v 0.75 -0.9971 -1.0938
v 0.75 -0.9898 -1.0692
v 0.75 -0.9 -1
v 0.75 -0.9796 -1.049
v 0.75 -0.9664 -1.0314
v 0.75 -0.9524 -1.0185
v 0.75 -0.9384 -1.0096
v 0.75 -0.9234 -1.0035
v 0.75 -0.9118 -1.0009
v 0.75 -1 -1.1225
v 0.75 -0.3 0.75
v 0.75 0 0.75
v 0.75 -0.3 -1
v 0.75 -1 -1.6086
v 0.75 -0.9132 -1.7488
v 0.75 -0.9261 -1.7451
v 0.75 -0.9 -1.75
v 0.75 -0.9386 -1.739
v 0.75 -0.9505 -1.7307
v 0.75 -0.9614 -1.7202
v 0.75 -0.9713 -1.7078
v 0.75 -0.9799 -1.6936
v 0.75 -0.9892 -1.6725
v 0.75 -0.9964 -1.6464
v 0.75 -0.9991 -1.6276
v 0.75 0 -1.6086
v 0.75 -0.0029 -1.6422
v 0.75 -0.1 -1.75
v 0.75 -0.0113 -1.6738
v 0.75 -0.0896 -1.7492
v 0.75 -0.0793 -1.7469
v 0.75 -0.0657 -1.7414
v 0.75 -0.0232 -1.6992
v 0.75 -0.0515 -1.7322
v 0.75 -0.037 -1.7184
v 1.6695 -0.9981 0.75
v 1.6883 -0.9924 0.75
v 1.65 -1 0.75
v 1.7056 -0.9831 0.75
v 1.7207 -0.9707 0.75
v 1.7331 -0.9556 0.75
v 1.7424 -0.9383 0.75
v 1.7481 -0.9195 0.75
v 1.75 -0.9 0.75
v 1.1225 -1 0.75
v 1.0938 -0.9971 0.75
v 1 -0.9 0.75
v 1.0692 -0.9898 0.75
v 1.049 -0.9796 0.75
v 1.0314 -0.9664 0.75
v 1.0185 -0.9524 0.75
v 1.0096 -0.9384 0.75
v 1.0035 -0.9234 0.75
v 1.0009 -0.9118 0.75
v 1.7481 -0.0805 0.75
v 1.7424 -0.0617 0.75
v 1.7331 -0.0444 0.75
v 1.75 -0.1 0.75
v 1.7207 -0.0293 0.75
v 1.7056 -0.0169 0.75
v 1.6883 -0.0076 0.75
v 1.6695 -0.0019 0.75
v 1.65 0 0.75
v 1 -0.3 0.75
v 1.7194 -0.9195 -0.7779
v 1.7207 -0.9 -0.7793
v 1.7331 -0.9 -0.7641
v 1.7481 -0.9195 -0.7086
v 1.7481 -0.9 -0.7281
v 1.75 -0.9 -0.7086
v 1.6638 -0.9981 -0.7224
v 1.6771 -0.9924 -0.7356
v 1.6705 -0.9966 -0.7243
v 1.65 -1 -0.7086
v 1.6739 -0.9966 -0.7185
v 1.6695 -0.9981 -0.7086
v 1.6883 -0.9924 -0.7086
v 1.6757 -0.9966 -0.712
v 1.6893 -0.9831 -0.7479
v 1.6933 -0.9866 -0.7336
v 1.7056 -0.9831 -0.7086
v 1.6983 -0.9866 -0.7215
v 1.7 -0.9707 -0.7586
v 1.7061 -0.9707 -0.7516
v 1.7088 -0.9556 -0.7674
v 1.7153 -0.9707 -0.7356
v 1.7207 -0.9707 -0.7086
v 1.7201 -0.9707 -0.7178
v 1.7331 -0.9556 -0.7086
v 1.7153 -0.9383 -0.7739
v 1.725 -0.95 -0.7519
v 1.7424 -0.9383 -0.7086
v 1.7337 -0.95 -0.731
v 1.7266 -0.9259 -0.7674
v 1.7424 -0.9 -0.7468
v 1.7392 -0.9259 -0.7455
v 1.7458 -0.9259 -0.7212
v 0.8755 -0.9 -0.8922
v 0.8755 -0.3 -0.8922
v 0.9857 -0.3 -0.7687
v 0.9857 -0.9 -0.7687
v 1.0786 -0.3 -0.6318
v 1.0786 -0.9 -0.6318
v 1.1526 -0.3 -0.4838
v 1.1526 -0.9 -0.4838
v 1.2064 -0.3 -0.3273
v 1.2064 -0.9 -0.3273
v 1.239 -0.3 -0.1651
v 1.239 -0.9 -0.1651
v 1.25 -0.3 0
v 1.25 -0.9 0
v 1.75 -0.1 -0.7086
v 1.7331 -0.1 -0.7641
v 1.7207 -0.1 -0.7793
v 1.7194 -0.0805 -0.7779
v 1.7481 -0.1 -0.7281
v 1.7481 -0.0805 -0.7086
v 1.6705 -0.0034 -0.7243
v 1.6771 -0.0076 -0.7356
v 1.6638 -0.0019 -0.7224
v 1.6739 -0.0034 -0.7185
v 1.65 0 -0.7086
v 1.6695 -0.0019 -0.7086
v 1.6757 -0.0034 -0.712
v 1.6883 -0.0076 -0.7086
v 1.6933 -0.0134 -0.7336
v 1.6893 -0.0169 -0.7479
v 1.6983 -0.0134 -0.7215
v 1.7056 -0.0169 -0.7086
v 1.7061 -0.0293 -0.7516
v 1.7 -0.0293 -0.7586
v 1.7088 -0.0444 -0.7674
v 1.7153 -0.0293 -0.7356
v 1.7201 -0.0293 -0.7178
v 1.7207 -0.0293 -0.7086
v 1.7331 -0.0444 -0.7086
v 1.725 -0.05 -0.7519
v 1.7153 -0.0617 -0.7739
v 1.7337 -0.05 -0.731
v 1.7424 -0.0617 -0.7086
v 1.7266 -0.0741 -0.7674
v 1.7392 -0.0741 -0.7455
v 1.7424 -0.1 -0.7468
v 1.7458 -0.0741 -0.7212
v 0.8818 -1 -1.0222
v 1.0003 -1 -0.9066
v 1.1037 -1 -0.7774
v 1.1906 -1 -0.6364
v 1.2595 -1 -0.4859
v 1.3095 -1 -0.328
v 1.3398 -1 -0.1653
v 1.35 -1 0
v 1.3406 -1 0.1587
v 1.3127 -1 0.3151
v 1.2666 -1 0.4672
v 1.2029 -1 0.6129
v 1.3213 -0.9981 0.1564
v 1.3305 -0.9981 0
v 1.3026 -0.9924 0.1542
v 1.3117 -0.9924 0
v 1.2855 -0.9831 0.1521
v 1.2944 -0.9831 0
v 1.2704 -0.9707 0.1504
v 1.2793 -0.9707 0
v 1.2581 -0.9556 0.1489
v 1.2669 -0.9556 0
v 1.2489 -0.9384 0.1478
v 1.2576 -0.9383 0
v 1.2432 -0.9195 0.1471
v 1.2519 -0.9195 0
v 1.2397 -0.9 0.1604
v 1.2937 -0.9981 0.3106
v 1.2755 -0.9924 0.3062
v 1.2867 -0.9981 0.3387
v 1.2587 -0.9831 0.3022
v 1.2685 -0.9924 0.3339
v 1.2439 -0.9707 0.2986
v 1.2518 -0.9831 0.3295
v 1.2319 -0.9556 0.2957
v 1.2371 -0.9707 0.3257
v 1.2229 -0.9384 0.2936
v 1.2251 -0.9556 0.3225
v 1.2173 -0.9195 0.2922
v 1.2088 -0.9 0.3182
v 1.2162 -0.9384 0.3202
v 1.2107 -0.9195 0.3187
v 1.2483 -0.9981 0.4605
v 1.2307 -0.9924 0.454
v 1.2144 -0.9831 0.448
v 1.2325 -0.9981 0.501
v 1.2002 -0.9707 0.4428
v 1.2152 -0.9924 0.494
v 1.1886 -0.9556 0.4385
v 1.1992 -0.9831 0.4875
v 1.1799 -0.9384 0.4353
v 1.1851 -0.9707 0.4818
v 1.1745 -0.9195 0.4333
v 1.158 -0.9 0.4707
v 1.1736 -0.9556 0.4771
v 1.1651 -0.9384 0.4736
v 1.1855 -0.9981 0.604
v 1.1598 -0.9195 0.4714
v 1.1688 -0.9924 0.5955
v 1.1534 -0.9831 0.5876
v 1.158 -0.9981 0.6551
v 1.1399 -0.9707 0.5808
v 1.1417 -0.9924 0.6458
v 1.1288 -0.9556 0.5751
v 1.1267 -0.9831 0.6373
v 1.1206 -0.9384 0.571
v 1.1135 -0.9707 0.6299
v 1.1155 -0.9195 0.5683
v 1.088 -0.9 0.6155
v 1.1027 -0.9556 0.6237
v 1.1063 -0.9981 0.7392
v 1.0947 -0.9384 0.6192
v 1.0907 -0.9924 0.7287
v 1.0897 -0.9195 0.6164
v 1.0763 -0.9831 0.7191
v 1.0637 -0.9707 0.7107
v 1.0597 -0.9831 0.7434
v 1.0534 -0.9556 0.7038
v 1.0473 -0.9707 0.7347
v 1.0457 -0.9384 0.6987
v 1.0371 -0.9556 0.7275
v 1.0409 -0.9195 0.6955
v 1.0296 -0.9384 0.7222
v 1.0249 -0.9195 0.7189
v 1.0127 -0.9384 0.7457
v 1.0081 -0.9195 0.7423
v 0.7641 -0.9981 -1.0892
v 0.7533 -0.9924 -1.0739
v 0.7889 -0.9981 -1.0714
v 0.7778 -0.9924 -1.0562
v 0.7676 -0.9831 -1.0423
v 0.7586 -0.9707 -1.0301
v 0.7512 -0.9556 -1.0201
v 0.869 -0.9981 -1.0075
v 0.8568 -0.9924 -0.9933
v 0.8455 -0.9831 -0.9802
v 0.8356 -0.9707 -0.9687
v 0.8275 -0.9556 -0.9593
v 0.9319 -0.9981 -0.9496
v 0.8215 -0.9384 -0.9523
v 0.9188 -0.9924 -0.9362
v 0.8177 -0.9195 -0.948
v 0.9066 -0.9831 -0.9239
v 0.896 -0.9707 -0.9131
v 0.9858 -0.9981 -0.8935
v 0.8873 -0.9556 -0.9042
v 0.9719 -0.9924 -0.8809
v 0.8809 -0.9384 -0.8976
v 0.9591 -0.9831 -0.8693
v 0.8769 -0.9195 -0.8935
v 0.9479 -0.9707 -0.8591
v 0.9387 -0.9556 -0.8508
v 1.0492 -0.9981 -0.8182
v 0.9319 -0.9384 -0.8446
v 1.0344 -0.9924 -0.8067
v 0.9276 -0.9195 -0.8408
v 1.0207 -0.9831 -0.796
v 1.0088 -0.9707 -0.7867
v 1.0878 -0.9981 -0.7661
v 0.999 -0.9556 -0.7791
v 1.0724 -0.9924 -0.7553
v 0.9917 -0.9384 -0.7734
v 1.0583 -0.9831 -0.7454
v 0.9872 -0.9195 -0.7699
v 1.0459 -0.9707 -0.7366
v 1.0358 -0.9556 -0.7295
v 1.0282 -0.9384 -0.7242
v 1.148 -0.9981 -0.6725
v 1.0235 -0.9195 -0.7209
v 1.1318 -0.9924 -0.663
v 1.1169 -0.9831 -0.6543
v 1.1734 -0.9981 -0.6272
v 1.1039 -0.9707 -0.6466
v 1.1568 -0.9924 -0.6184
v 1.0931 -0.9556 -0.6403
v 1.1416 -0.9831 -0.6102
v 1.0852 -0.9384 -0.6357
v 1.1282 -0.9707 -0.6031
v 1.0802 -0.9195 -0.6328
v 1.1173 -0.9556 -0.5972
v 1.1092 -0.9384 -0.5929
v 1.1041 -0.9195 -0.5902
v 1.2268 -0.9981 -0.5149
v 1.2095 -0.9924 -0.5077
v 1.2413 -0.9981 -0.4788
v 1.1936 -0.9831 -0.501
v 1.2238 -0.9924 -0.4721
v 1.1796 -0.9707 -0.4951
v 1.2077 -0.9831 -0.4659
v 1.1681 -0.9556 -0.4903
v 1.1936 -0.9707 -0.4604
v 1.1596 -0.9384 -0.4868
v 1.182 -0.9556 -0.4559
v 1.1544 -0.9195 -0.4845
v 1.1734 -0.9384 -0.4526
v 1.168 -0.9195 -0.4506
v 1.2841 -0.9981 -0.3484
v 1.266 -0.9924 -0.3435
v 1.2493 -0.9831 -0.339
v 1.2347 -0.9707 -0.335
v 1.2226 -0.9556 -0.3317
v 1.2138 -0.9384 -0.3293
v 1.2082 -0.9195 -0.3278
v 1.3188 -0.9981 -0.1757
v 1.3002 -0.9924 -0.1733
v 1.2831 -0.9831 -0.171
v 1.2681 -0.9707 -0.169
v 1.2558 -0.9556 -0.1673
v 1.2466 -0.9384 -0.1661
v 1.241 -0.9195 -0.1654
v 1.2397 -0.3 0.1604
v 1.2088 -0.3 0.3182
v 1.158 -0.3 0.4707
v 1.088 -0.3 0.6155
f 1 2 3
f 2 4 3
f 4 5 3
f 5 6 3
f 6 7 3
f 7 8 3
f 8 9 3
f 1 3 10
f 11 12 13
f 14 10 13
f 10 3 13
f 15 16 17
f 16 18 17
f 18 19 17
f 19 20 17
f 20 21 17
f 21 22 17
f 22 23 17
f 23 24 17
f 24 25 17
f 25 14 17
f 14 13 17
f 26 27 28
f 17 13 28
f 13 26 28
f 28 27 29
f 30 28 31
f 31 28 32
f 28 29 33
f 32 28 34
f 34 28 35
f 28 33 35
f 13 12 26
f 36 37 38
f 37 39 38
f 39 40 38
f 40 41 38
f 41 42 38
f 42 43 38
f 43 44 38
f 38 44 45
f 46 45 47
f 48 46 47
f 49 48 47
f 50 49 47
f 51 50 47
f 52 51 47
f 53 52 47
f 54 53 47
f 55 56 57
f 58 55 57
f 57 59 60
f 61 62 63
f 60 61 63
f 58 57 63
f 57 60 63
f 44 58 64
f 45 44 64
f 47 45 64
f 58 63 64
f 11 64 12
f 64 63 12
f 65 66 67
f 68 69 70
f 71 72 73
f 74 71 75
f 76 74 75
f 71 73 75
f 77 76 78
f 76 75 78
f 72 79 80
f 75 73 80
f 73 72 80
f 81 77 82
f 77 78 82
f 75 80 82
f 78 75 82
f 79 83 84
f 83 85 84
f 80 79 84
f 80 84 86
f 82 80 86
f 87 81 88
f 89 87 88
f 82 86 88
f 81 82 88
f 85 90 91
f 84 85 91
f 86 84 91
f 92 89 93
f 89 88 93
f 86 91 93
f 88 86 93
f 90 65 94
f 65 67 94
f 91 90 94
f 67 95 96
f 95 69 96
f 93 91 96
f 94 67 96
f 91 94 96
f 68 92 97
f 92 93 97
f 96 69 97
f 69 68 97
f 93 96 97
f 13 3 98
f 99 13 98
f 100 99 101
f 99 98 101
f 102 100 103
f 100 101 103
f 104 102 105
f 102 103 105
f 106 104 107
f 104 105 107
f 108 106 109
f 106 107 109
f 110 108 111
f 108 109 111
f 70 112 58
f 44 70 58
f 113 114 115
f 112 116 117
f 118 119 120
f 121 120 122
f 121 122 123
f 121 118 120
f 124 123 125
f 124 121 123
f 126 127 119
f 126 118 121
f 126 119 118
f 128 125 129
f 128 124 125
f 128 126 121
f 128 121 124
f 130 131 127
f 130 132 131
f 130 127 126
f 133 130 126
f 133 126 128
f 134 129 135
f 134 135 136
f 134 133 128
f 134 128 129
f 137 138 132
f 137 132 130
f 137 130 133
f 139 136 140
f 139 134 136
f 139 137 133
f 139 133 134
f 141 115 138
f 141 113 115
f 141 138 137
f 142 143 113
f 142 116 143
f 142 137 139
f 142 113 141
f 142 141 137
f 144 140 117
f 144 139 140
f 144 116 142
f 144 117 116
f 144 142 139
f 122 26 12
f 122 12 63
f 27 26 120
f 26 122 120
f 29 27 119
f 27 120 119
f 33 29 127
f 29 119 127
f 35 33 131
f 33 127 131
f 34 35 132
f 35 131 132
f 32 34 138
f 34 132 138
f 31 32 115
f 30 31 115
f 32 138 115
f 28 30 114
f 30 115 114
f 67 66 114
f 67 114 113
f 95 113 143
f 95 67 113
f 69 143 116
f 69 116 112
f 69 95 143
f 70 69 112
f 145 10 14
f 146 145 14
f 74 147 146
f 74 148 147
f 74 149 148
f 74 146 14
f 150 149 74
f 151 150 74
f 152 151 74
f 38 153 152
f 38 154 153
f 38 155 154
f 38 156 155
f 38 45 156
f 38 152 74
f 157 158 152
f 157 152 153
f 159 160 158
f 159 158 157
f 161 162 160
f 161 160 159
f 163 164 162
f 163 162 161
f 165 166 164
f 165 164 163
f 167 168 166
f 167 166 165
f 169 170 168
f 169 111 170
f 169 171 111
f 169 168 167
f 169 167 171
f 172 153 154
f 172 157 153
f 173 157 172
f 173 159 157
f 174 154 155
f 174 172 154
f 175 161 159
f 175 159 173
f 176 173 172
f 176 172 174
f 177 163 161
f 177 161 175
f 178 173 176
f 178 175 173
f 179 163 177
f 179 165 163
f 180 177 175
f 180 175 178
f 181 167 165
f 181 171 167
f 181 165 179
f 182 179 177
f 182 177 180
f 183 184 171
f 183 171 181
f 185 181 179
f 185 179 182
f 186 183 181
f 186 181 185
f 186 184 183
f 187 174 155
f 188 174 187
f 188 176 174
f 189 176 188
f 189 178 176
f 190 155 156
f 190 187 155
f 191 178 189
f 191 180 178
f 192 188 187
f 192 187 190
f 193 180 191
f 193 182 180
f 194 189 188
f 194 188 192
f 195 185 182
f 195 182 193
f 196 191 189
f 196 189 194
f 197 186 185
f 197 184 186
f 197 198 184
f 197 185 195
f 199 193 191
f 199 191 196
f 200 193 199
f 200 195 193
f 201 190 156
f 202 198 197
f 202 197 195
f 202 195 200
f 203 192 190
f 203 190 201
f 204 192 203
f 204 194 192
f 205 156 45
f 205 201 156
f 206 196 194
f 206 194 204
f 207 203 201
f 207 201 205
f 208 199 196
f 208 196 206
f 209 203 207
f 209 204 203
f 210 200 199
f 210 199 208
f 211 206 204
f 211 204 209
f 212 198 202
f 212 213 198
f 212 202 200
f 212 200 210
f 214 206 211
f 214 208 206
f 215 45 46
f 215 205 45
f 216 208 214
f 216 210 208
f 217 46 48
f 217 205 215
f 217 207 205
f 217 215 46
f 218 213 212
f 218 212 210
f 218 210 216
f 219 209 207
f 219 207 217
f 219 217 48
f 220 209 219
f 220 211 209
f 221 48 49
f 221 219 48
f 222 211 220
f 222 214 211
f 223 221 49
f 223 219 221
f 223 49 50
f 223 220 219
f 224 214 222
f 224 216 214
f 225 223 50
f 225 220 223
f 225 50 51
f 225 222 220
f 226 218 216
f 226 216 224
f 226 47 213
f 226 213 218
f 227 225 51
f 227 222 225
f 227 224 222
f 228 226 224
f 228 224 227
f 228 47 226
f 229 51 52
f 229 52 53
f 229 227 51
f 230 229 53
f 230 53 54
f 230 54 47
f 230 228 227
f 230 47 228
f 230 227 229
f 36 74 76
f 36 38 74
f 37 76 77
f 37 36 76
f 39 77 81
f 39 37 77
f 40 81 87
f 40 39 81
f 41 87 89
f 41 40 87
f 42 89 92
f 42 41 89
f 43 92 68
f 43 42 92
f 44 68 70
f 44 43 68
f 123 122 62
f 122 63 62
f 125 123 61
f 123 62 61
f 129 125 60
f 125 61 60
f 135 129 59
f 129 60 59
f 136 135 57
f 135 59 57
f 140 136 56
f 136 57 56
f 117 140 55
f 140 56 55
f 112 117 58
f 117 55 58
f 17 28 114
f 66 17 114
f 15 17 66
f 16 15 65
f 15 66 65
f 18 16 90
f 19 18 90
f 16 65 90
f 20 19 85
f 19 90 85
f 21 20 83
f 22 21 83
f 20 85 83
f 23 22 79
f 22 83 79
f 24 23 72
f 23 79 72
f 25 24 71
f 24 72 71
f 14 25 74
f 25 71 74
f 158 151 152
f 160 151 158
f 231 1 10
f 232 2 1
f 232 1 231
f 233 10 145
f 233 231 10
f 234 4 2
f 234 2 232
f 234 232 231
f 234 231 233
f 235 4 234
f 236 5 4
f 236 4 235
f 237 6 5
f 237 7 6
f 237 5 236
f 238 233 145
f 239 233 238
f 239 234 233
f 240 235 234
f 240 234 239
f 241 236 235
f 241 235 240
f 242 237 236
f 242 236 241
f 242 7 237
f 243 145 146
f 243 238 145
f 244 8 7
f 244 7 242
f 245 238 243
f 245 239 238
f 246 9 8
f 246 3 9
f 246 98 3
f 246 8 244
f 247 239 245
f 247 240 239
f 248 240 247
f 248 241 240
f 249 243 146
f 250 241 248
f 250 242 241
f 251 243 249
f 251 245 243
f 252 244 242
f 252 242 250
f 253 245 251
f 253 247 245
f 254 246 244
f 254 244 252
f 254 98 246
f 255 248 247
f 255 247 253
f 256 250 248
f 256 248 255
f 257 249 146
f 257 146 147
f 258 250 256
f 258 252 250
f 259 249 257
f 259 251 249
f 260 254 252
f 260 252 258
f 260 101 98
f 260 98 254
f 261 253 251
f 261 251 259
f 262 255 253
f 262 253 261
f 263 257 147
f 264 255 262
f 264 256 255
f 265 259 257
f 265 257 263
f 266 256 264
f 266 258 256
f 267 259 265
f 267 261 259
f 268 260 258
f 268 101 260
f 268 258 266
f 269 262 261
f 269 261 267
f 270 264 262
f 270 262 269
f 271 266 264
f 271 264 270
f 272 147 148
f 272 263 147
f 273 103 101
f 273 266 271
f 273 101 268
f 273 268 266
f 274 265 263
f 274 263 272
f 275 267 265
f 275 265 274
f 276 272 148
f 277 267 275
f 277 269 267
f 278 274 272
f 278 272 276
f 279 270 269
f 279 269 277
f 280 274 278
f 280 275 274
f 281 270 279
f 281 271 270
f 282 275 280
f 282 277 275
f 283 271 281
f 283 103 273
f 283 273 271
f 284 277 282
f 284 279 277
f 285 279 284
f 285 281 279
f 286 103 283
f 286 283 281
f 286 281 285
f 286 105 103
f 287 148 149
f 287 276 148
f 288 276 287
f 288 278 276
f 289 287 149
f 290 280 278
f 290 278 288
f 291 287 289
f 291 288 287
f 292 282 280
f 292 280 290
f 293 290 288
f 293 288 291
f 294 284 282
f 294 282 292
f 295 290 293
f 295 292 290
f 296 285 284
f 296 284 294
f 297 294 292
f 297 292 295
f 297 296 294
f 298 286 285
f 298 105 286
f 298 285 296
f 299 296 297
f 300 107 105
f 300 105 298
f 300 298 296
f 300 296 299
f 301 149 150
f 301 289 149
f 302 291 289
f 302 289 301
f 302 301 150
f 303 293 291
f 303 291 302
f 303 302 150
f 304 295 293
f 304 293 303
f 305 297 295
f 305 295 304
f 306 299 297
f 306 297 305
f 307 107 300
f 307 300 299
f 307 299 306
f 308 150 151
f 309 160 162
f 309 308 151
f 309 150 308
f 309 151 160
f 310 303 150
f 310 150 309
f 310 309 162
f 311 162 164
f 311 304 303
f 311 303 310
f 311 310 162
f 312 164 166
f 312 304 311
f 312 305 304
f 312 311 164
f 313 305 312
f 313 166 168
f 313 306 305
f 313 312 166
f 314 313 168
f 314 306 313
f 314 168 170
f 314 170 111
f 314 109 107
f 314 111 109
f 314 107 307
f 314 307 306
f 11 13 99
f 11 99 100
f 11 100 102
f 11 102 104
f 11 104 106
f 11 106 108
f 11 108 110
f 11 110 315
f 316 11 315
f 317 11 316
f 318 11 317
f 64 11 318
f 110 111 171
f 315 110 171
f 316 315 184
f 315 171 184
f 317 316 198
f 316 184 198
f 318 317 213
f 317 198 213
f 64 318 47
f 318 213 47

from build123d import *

# Parameters (mm, degrees)
F1_DEPTH = 1
F3_DEPTH = 0.7
F4_R     = 0.1


with BuildPart() as f1:
    # F0 (on Front) → F1 (new body)
    with BuildSketch(Plane.XZ):
        with BuildLine():
            Line((1, 0.75), (0.75, 0.75))
            Line((0.75, 0.75), (0.75, -1))
            ThreePointArc((0.75, -1), (1.237437, -0.176777), (1, 0.75))
        make_face()
        with BuildLine():
            ThreePointArc((1, 0.75), (1.237437, -0.176777), (0.75, -1))
            Line((0.75, -1), (0.75, -1.75))
            Line((0.75, -1.75), (1.75, -0.75))
            Line((1.75, -0.75), (1.75, 0.75))
            Line((1.75, 0.75), (1, 0.75))
        make_face()
    extrude(amount=F1_DEPTH)

    # F2 (on face) → F3 (cut)
    with BuildSketch(Plane.XZ.offset(1)):
        with BuildLine():
            ThreePointArc((0.75, -1), (1.118034, -0.559017), (1.25, 0))
            ThreePointArc((1.25, 0), (1.185854, 0.395285), (1, 0.75))
            Line((1, 0.75), (0.75, 0.75))
            Line((0.75, 0.75), (0.75, -1))
        make_face()
        with BuildLine():
            Line((0.75, 0.75), (1, 0.75))
            ThreePointArc((1, 0.75), (-1.237437, 0.176777), (0.75, -1))
            Line((0.75, -1), (0.75, 0.75))
        make_face()
    extrude(amount=-F3_DEPTH, mode=Mode.SUBTRACT)

    # F4
    f4_edges = [f1.edges().sort_by_distance(p)[0] for p in [
        (1.75, -1, 0),
        (1.237437, -1, -0.176777),
        (1.75, 0, 0),
        (1.75, -0.5, -0.75),
        (1.25, -1, -1.25),
        (1.25, 0, -1.25),
    ]]
    fillet(f4_edges, radius=F4_R)


solid = f1.part
